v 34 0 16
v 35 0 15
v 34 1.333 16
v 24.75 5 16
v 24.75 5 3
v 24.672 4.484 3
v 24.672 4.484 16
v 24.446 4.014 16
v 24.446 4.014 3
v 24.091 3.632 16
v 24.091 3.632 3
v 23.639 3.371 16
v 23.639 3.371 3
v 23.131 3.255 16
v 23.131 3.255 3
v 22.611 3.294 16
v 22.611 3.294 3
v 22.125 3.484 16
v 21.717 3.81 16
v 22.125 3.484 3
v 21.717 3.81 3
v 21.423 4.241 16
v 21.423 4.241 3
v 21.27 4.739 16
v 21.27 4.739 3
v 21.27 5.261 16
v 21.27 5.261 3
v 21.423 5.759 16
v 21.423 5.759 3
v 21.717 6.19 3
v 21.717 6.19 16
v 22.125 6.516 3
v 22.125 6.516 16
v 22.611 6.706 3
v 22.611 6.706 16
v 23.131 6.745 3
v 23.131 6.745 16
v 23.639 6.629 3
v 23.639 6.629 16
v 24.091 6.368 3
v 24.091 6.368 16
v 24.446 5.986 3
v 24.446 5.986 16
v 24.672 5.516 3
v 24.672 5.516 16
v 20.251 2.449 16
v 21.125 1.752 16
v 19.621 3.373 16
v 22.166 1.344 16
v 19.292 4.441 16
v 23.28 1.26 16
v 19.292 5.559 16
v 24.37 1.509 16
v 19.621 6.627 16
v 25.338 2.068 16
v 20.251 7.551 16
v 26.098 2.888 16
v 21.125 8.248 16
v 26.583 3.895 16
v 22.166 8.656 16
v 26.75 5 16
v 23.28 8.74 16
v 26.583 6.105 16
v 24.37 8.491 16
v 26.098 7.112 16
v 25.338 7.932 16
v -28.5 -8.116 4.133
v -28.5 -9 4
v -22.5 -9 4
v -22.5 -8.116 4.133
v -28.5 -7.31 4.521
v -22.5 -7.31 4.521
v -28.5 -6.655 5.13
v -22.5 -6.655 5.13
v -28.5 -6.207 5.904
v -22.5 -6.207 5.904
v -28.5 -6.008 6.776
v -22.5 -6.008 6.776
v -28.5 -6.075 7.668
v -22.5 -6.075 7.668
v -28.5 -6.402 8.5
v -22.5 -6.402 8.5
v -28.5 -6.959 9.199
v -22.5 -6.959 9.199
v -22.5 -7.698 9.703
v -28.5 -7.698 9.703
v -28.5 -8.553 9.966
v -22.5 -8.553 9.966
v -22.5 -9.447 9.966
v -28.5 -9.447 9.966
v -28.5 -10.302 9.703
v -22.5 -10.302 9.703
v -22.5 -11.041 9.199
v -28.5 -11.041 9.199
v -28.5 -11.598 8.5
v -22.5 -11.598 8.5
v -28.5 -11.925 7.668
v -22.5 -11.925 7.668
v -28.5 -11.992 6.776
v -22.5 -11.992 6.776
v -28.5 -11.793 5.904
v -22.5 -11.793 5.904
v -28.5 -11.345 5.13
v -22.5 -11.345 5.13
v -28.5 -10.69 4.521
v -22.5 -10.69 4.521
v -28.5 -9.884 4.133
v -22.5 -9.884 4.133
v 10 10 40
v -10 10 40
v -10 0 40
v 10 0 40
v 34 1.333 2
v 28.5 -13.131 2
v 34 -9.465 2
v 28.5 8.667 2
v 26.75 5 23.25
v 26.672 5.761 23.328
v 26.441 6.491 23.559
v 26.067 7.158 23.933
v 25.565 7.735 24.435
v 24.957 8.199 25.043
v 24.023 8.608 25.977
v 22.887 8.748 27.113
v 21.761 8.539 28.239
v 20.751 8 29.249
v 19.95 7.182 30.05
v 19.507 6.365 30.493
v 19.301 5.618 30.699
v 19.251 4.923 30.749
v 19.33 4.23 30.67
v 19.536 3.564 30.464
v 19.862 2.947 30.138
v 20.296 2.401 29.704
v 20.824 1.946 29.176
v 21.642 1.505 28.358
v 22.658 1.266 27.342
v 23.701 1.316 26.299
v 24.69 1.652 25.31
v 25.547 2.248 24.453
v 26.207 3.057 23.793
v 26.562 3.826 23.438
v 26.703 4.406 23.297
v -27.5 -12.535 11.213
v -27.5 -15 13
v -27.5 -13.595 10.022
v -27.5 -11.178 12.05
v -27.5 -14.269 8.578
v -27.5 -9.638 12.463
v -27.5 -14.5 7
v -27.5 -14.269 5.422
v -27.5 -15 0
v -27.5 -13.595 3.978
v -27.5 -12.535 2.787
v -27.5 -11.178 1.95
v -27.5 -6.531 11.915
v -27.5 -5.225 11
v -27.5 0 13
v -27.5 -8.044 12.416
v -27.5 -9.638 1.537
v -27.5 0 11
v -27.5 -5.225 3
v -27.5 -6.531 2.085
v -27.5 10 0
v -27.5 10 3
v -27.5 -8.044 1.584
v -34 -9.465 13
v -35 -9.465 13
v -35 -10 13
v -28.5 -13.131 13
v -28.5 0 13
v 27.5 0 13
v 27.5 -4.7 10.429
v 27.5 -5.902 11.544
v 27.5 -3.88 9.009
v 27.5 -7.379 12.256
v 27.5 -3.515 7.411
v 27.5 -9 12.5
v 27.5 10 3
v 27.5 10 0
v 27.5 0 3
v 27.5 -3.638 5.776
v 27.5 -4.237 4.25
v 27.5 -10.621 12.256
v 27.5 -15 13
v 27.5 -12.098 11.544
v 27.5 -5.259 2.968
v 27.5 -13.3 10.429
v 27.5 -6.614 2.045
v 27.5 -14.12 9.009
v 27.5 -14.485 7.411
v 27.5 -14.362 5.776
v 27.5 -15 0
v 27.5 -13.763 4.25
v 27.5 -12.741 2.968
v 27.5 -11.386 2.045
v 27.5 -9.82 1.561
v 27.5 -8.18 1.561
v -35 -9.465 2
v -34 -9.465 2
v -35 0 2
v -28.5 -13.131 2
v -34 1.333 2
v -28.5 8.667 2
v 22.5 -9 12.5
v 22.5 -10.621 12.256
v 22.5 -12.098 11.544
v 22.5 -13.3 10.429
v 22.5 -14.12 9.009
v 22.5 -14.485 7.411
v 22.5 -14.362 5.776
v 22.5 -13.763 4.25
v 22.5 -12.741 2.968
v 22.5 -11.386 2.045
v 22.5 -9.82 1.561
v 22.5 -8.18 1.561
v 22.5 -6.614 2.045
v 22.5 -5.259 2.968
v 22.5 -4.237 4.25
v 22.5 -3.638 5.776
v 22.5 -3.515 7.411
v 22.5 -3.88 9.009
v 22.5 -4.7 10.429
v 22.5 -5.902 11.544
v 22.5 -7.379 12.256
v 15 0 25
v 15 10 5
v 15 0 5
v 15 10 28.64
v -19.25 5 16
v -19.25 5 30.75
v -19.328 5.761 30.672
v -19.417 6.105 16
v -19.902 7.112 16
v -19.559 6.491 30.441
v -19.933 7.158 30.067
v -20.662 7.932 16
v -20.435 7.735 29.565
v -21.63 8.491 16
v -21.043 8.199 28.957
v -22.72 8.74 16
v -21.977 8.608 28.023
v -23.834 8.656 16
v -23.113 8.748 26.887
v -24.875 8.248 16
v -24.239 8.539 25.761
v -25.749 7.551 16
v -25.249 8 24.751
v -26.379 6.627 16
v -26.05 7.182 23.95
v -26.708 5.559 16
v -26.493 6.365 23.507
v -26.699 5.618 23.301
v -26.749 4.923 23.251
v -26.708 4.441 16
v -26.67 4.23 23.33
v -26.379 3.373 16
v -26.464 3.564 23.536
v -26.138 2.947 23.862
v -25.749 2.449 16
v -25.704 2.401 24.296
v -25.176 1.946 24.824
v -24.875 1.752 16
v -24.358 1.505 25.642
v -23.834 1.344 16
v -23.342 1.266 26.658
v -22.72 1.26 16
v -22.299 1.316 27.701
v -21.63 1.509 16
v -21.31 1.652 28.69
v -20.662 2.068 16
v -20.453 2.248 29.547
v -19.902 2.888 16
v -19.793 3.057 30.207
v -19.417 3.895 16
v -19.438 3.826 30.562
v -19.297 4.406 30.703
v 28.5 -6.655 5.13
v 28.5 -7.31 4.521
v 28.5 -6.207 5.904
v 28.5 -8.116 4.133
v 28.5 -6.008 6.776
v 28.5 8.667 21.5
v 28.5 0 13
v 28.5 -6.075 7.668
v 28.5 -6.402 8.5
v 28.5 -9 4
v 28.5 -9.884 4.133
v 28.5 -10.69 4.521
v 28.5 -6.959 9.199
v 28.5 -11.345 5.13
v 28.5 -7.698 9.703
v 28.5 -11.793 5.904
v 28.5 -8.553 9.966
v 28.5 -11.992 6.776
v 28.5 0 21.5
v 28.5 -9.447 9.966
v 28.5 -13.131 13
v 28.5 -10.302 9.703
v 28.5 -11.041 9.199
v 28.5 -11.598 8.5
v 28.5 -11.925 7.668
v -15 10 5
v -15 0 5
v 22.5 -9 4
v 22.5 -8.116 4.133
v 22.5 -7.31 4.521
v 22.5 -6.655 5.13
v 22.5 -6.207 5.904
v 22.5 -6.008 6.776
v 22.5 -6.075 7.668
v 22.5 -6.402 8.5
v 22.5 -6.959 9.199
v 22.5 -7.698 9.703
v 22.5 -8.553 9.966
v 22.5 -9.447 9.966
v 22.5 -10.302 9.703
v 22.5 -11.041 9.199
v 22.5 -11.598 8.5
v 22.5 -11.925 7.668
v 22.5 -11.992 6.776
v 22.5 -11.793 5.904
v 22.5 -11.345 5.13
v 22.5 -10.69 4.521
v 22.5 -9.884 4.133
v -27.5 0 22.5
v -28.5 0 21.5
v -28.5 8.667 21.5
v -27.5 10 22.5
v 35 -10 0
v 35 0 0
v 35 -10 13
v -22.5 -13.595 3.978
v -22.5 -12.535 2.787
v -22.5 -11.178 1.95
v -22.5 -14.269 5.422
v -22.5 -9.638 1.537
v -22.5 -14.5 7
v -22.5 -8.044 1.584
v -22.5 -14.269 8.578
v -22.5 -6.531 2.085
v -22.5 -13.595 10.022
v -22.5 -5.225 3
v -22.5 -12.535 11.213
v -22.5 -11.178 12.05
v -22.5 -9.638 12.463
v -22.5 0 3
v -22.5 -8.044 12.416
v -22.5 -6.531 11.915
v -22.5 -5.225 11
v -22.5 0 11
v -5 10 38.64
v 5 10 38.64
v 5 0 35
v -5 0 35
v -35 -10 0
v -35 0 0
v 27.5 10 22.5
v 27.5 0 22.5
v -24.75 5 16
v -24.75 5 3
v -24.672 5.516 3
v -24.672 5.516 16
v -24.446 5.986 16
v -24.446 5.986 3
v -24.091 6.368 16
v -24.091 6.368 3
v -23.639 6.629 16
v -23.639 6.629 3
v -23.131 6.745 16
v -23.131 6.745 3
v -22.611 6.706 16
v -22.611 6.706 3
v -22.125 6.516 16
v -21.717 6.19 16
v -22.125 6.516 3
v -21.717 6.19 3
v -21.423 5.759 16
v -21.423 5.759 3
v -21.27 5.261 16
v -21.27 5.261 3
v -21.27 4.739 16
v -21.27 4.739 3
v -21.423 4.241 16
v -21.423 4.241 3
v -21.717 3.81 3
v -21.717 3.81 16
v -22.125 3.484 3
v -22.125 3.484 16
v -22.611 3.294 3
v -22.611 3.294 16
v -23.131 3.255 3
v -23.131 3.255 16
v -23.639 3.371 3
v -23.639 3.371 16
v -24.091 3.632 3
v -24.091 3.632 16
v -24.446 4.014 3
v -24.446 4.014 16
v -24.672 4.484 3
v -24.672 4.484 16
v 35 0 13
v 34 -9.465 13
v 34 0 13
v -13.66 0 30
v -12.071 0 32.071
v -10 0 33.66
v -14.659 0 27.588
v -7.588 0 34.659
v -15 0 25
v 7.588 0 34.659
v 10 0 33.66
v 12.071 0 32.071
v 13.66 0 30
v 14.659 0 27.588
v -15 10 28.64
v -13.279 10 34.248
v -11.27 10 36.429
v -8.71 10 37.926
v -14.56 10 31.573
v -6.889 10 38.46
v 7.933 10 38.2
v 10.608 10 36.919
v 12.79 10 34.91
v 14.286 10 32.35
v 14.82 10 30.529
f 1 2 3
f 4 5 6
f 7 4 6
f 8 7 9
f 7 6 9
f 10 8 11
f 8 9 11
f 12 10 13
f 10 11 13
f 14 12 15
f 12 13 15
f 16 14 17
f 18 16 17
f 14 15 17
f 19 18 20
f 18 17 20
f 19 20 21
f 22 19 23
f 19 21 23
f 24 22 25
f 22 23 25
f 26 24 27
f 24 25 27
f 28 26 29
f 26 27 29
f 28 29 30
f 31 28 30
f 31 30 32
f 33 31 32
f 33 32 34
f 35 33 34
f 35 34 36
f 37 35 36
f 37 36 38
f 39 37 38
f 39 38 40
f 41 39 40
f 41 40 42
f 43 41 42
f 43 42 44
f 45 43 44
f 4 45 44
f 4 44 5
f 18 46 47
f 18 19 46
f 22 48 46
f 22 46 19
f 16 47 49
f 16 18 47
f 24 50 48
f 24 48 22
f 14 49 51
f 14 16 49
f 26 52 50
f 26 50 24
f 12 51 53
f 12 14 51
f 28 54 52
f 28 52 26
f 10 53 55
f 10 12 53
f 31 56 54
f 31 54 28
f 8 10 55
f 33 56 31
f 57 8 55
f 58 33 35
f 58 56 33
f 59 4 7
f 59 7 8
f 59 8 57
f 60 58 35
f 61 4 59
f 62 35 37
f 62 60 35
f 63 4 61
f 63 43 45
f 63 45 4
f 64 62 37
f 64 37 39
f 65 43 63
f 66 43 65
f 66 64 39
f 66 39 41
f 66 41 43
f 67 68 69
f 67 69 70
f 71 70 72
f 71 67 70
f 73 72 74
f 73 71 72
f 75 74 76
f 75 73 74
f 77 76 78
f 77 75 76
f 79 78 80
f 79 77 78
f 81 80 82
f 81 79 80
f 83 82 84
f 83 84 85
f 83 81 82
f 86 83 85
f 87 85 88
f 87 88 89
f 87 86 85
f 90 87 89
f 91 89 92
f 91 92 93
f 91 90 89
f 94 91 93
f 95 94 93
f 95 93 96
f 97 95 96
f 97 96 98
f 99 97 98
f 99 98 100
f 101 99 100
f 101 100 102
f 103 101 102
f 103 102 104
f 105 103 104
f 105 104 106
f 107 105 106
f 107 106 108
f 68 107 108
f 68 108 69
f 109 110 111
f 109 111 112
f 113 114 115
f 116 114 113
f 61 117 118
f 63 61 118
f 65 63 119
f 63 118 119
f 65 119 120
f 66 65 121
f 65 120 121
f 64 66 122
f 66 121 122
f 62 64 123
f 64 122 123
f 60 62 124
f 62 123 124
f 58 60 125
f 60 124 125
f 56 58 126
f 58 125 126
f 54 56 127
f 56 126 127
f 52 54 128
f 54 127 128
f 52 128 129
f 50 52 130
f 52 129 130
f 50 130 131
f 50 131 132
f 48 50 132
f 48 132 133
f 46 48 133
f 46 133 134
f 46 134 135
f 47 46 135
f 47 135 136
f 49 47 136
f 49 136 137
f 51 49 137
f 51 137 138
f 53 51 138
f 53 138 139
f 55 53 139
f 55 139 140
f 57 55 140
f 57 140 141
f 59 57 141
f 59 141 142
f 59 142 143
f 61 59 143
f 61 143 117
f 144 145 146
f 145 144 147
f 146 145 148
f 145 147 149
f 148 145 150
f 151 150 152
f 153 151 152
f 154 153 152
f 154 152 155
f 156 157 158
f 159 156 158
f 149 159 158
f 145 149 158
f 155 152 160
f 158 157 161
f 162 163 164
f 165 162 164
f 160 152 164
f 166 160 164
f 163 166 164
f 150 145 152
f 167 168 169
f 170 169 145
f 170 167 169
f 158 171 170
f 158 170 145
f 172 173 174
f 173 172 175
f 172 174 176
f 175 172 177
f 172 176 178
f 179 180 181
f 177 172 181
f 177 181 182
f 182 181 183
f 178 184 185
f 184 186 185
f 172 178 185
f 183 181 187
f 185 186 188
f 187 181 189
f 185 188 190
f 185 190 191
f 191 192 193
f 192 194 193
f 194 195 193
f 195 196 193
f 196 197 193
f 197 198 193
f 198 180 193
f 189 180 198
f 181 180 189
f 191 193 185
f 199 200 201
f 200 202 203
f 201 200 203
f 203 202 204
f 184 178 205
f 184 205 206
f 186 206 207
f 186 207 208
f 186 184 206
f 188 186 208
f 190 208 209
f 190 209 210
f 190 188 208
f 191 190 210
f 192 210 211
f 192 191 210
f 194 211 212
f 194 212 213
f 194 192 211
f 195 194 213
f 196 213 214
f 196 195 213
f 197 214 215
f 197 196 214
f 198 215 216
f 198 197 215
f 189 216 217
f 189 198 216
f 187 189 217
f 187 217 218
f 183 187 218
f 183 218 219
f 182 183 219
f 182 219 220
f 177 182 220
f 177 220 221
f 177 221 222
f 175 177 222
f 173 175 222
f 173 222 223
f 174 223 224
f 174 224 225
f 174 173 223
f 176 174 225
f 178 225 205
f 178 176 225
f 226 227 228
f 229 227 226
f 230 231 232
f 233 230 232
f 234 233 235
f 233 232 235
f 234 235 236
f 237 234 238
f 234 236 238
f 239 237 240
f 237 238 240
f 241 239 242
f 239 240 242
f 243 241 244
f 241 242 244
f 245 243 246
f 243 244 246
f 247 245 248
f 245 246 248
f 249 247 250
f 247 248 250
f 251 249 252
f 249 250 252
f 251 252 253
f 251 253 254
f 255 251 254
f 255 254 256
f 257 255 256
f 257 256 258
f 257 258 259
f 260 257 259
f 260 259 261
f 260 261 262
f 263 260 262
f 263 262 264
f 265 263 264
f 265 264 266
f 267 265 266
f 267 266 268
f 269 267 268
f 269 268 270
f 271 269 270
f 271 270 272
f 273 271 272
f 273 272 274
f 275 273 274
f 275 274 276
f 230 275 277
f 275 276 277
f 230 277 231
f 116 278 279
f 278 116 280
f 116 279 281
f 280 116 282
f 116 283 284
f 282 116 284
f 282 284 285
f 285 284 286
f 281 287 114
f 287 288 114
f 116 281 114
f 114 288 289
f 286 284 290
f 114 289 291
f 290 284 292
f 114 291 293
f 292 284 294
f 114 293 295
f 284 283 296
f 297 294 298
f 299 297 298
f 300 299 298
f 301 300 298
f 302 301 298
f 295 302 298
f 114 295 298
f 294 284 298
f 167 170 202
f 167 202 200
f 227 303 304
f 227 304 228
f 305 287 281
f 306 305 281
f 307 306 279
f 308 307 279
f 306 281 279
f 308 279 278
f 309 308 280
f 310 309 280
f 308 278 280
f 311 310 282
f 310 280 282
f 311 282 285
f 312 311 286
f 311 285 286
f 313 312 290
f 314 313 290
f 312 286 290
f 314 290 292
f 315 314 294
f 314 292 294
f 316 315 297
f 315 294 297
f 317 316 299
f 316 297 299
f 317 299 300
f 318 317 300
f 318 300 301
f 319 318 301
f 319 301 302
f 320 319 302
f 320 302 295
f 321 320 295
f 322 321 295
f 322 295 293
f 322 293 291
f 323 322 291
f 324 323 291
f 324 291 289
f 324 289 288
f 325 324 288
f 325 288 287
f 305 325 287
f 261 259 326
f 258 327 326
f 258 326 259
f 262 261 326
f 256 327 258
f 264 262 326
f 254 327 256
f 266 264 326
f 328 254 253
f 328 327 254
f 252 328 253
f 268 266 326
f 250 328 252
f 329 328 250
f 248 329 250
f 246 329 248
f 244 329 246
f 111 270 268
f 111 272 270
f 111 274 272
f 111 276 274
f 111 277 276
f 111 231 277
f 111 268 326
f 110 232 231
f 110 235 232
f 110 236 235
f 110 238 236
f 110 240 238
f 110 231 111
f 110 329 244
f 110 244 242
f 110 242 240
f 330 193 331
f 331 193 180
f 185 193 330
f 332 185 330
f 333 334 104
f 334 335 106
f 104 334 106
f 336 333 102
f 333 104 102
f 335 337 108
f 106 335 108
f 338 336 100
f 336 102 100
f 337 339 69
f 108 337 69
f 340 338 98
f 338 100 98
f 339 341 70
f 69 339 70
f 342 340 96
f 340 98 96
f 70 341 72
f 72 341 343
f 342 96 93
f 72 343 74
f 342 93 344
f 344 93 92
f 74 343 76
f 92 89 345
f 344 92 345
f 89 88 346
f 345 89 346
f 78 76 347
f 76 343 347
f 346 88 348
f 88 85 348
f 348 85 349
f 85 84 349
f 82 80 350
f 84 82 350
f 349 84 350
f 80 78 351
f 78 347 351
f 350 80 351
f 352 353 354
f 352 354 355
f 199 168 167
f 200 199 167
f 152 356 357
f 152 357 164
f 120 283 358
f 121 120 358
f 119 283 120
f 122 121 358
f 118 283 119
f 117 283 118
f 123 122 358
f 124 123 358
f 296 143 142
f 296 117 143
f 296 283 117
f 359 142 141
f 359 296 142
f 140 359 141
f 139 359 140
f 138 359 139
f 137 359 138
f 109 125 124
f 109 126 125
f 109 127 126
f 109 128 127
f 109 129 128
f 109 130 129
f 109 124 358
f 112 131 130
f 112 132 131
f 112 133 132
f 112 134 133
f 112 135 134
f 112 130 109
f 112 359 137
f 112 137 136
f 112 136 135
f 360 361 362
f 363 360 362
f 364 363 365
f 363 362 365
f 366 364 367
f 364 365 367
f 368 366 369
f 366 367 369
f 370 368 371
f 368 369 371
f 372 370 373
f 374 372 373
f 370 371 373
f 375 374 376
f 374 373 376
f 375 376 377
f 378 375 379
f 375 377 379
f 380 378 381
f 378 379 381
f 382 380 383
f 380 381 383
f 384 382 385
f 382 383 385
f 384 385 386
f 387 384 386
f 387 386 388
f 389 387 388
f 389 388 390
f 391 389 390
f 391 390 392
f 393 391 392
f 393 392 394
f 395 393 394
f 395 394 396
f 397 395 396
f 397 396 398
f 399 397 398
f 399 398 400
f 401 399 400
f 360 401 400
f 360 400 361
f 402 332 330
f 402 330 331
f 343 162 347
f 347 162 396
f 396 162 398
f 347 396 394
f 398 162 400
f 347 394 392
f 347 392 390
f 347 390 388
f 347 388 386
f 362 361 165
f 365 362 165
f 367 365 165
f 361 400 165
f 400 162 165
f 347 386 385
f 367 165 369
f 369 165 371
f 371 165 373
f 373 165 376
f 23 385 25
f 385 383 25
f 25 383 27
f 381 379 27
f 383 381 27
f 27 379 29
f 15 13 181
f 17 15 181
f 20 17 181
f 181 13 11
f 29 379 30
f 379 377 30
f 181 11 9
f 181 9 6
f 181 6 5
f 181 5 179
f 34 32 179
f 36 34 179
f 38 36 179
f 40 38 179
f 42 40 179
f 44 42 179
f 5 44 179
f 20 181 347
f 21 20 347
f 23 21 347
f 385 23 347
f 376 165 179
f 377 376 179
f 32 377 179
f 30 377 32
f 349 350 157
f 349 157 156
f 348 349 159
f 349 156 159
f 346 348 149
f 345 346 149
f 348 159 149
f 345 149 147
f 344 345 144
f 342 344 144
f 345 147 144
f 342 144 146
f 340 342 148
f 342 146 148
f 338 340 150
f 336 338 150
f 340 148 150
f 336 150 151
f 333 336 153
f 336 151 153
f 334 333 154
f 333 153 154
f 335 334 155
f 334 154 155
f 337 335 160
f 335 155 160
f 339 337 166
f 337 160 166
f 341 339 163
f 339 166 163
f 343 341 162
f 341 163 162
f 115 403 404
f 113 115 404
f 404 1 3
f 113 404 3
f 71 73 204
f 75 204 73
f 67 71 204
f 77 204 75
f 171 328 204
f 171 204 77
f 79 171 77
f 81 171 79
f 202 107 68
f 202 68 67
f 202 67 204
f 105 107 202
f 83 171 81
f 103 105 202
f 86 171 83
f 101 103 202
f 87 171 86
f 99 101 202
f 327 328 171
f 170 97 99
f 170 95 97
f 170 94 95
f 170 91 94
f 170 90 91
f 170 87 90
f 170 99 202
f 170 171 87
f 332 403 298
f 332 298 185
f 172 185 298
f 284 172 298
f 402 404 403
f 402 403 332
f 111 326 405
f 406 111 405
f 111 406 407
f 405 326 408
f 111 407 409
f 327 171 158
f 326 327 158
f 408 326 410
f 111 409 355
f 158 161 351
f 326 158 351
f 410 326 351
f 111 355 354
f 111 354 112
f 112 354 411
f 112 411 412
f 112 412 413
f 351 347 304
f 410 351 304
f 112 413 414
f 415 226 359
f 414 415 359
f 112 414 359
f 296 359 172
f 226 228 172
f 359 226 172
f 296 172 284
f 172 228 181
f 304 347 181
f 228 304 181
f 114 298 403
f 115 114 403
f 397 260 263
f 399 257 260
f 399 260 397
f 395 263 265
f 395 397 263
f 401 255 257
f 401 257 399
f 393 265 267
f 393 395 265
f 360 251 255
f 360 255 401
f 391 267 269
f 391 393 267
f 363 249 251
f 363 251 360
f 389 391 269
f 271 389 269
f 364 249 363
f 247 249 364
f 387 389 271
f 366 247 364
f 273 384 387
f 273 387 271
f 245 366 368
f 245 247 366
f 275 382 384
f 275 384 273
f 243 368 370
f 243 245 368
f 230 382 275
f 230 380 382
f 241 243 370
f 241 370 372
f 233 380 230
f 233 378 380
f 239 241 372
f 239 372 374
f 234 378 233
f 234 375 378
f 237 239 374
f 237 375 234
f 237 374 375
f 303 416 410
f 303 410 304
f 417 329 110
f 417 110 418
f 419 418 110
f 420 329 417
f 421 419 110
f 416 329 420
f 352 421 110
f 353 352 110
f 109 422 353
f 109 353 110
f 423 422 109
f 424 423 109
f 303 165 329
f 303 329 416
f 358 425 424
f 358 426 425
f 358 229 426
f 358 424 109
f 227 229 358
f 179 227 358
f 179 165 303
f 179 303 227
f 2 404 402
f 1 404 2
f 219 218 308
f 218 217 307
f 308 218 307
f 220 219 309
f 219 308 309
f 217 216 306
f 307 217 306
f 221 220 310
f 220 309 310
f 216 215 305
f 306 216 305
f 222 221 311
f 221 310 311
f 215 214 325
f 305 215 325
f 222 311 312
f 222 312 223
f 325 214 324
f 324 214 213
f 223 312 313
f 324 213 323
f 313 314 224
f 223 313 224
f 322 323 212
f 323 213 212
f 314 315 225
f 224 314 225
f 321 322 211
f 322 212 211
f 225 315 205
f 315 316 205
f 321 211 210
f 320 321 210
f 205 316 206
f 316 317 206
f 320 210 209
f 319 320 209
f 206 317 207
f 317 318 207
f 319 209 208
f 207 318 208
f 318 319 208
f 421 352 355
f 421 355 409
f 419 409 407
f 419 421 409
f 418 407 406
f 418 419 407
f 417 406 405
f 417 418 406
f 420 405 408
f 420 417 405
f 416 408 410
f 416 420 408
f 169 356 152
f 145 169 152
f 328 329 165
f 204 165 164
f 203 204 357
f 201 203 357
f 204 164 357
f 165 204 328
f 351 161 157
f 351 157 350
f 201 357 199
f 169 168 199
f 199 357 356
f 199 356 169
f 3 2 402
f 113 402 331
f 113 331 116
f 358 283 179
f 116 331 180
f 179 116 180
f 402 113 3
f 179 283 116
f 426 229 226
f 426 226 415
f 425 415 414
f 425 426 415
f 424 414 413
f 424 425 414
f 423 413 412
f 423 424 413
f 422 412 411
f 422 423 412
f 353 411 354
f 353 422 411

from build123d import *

# Parameters (mm, degrees)
BOSS_EXTRUDE1_DEPTH      = 40
CHAMFER1_SIZE            = 25
SKETCH3_W                = 55
SKETCH3_H                = 30.849850196
CUT_EXTRUDE2_DEPTH       = 3
SKETCH5_R                = 1.75
CUT_EXTRUDE4_DEPTH       = 56.226805086
CUT_EXTRUDE3_DEPTH       = 38
SKETCH6_R                = 5.5
SKETCH6_R_2              = 3
BOSS_EXTRUDE2_DEPTH      = 5
CUT_EXTRUDE5_START       = -2
SKETCH7_R                = 3
CUT_EXTRUDE5_DEPTH       = 2
SKETCH9_R                = 3.75
CUT_EXTRUDE7_DEPTH       = 24
SKETCH10_W               = 80.05733418
SKETCH10_H               = 23.210803027
CUT_EXTRUDE8_DEPTH       = 27
BOSS_EXTRUDE3_REACH      = 57.227
BOSS_EXTRUDE3_END_RADIUS = 5.5
SKETCH13_W               = 5
SKETCH13_H               = 8
SKETCH14_W               = 8.301356979
SKETCH14_H               = 17.411858477
CUT_EXTRUDE9_DEPTH       = 38
SKETCH15_W               = 30
SKETCH15_H               = 2
BOSS_EXTRUDE4_DEPTH      = 10


with BuildPart() as part:
    # Sketch1 → Boss-Extrude1 (new body)
    with BuildSketch(Plane.XY):
        Polygon((-27.5, 0), (27.5, 0), (27.5, -15), (35, -10), (35, 0), (27.5, 10), (-27.5, 10), (-35, 0), (-35, -10), (-27.5, -15), align=None)
    extrude(amount=BOSS_EXTRUDE1_DEPTH)

    # Chamfer1
    # the kernel refuses this chamfer: 25 mm, written as the material it takes off along each edge
    with BuildSketch(Plane(origin=(35, -74.292074699, 40), x_dir=(0.027495876610586317, 0, -0.9996219169112966), z_dir=(0, 1, 0)), Plane(origin=(-35, 64.292074699, 40), x_dir=(-0.027495876610586317, 0, -0.9996219169112966), z_dir=(0, -1, 0))) as chamfer1_piece_1:
        Polygon((CHAMFER1_SIZE * 0.999621916911, CHAMFER1_SIZE * 0.0274958766106), (-CHAMFER1_SIZE * 0.0274958766106, CHAMFER1_SIZE * 0.999621916911), (0, 0), align=None)
    extrude(amount=138.584149398, mode=Mode.SUBTRACT)

    # Sketch3 → Cut-Extrude2 (cut)
    with BuildSketch(Plane(origin=(0, 0, 0), x_dir=(-1, 0, 0), z_dir=(0, 0, -1))):
        Rectangle(SKETCH3_W, SKETCH3_H)
    extrude(amount=-CUT_EXTRUDE2_DEPTH, mode=Mode.SUBTRACT)

    # Sketch5 → Cut-Extrude4 (cut, through all)
    with BuildSketch(Plane(origin=(0, 0, 0), x_dir=(-1, 0, 0), z_dir=(0, 0, -1))):
        with Locations(Location((-23, 5, 0), (0, 0, 180))):
            Circle(SKETCH5_R)
        with Locations((23, 5)):
            Circle(SKETCH5_R)
    extrude(amount=-CUT_EXTRUDE4_DEPTH, mode=Mode.SUBTRACT)

    # Sketch4 → Cut-Extrude3 (cut)
    with BuildSketch(Plane.XY.offset(40)):
        Polygon((-34, 1.333333333), (-28.5, 8.666666667), (-28.5, -13.131482908), (-34, -9.464816242), align=None)
    cut_extrude3 = extrude(amount=-CUT_EXTRUDE3_DEPTH, mode=Mode.SUBTRACT)

    # Sketch6 → Boss-Extrude2 (add)
    with BuildSketch(Plane(origin=(-27.5, 0, 0), x_dir=(0, 0, -1), z_dir=(1, 0, 0))):
        with Locations(Location((-7, -9, 0), (0, 0, 180))):
            Circle(SKETCH6_R)
        with Locations((-7, -9)):
            Circle(SKETCH6_R_2, mode=Mode.SUBTRACT)
    boss_extrude2 = extrude(amount=BOSS_EXTRUDE2_DEPTH)

    # Sketch7 → Cut-Extrude5 (cut)
    with BuildSketch(Plane(origin=(-27.5, 0, 0), x_dir=(0, 0, -1), z_dir=(1, 0, 0)).offset(CUT_EXTRUDE5_START)):
        with Locations((-7, -9)):
            Circle(SKETCH7_R)
    cut_extrude5 = extrude(amount=CUT_EXTRUDE5_DEPTH, mode=Mode.SUBTRACT)

    # Mirror1: Cut-Extrude3, Boss-Extrude2, Cut-Extrude5 across plane
    add(cut_extrude3.mirror(Plane(origin=(0, 0, 0), x_dir=(0, 0, 1), z_dir=(1, 0, 0))), mode=Mode.SUBTRACT)
    add(boss_extrude2.mirror(Plane(origin=(0, 0, 0), x_dir=(0, 0, 1), z_dir=(1, 0, 0))))
    add(cut_extrude5.mirror(Plane(origin=(0, 0, 0), x_dir=(0, 0, 1), z_dir=(1, 0, 0))), mode=Mode.SUBTRACT)

    # Sketch9 → Cut-Extrude7 (cut)
    with BuildSketch(Plane.XY.offset(40)):
        with Locations((-23, 5)):
            Circle(SKETCH9_R)
        with Locations((23, 5)):
            Circle(SKETCH9_R)
    extrude(amount=-CUT_EXTRUDE7_DEPTH, mode=Mode.SUBTRACT)

    # Sketch10 → Cut-Extrude8 (cut)
    with BuildSketch(Plane.XY.offset(40)):
        with Locations((1.832814427, -11.605401514)):
            Rectangle(SKETCH10_W, SKETCH10_H)
    extrude(amount=-CUT_EXTRUDE8_DEPTH, mode=Mode.SUBTRACT)

    # Cut-Sweep1: sweep along a path in Sketch11
    with BuildLine(Plane(origin=(0, 0, 0), x_dir=(0, 0, -1), z_dir=(1, 0, 0))) as cut_sweep1_path:
        Line((0, 0), (-9.226976352, 25.350909176))
    # Sketch2 → Cut-Sweep1 (sweep, cut)
    with BuildSketch(Plane.XZ):
        with BuildLine():
            Line((-15, -35), (15, -35))
            Line((15, -35), (15, 25))
            ThreePointArc((15, 25), (12.071067812, 32.071067812), (5, 35))
            Line((5, 35), (-5, 35))
            ThreePointArc((-5, 35), (-12.071067812, 32.071067812), (-15, 25))
            Line((-15, 25), (-15, -35))
        make_face()
    sweep(path=cut_sweep1_path.line, mode=Mode.SUBTRACT)

    # Boss-Extrude3: up to this cylinder (the profile starts outside it)
    boss_extrude3_end = Plane(origin=(-25, -9, 7), z_dir=(-1, 0, 0)) * Cylinder(BOSS_EXTRUDE3_END_RADIUS, 126.454, mode=Mode.PRIVATE)
    # Sketch13 → Boss-Extrude3 (add, up to the surface)
    with BuildSketch(Plane.XZ, mode=Mode.PRIVATE) as boss_extrude3_sk1:
        with Locations((-25, 7)):
            Rectangle(SKETCH13_W, SKETCH13_H)
    boss_extrude3_tool1 = extrude(boss_extrude3_sk1.sketch, amount=BOSS_EXTRUDE3_REACH, mode=Mode.PRIVATE) - boss_extrude3_end
    add(boss_extrude3_tool1.solids().sort_by_distance((-25, 0, 7))[0])

    # Sketch14 → Cut-Extrude9 (cut)
    with BuildSketch(Plane.XY.offset(40)):
        with Locations((-38.15067849, -0.758887004)):
            Rectangle(SKETCH14_W, SKETCH14_H)
    extrude(amount=-CUT_EXTRUDE9_DEPTH, mode=Mode.SUBTRACT)

    # Sketch15 → Boss-Extrude4 (add)
    with BuildSketch(Plane(origin=(0, 10, 0), x_dir=(1, 0, 0), z_dir=(0, 1, 0))):
        with Locations((0, -4)):
            Rectangle(SKETCH15_W, SKETCH15_H)
    extrude(amount=-BOSS_EXTRUDE4_DEPTH)


solid = part.part
